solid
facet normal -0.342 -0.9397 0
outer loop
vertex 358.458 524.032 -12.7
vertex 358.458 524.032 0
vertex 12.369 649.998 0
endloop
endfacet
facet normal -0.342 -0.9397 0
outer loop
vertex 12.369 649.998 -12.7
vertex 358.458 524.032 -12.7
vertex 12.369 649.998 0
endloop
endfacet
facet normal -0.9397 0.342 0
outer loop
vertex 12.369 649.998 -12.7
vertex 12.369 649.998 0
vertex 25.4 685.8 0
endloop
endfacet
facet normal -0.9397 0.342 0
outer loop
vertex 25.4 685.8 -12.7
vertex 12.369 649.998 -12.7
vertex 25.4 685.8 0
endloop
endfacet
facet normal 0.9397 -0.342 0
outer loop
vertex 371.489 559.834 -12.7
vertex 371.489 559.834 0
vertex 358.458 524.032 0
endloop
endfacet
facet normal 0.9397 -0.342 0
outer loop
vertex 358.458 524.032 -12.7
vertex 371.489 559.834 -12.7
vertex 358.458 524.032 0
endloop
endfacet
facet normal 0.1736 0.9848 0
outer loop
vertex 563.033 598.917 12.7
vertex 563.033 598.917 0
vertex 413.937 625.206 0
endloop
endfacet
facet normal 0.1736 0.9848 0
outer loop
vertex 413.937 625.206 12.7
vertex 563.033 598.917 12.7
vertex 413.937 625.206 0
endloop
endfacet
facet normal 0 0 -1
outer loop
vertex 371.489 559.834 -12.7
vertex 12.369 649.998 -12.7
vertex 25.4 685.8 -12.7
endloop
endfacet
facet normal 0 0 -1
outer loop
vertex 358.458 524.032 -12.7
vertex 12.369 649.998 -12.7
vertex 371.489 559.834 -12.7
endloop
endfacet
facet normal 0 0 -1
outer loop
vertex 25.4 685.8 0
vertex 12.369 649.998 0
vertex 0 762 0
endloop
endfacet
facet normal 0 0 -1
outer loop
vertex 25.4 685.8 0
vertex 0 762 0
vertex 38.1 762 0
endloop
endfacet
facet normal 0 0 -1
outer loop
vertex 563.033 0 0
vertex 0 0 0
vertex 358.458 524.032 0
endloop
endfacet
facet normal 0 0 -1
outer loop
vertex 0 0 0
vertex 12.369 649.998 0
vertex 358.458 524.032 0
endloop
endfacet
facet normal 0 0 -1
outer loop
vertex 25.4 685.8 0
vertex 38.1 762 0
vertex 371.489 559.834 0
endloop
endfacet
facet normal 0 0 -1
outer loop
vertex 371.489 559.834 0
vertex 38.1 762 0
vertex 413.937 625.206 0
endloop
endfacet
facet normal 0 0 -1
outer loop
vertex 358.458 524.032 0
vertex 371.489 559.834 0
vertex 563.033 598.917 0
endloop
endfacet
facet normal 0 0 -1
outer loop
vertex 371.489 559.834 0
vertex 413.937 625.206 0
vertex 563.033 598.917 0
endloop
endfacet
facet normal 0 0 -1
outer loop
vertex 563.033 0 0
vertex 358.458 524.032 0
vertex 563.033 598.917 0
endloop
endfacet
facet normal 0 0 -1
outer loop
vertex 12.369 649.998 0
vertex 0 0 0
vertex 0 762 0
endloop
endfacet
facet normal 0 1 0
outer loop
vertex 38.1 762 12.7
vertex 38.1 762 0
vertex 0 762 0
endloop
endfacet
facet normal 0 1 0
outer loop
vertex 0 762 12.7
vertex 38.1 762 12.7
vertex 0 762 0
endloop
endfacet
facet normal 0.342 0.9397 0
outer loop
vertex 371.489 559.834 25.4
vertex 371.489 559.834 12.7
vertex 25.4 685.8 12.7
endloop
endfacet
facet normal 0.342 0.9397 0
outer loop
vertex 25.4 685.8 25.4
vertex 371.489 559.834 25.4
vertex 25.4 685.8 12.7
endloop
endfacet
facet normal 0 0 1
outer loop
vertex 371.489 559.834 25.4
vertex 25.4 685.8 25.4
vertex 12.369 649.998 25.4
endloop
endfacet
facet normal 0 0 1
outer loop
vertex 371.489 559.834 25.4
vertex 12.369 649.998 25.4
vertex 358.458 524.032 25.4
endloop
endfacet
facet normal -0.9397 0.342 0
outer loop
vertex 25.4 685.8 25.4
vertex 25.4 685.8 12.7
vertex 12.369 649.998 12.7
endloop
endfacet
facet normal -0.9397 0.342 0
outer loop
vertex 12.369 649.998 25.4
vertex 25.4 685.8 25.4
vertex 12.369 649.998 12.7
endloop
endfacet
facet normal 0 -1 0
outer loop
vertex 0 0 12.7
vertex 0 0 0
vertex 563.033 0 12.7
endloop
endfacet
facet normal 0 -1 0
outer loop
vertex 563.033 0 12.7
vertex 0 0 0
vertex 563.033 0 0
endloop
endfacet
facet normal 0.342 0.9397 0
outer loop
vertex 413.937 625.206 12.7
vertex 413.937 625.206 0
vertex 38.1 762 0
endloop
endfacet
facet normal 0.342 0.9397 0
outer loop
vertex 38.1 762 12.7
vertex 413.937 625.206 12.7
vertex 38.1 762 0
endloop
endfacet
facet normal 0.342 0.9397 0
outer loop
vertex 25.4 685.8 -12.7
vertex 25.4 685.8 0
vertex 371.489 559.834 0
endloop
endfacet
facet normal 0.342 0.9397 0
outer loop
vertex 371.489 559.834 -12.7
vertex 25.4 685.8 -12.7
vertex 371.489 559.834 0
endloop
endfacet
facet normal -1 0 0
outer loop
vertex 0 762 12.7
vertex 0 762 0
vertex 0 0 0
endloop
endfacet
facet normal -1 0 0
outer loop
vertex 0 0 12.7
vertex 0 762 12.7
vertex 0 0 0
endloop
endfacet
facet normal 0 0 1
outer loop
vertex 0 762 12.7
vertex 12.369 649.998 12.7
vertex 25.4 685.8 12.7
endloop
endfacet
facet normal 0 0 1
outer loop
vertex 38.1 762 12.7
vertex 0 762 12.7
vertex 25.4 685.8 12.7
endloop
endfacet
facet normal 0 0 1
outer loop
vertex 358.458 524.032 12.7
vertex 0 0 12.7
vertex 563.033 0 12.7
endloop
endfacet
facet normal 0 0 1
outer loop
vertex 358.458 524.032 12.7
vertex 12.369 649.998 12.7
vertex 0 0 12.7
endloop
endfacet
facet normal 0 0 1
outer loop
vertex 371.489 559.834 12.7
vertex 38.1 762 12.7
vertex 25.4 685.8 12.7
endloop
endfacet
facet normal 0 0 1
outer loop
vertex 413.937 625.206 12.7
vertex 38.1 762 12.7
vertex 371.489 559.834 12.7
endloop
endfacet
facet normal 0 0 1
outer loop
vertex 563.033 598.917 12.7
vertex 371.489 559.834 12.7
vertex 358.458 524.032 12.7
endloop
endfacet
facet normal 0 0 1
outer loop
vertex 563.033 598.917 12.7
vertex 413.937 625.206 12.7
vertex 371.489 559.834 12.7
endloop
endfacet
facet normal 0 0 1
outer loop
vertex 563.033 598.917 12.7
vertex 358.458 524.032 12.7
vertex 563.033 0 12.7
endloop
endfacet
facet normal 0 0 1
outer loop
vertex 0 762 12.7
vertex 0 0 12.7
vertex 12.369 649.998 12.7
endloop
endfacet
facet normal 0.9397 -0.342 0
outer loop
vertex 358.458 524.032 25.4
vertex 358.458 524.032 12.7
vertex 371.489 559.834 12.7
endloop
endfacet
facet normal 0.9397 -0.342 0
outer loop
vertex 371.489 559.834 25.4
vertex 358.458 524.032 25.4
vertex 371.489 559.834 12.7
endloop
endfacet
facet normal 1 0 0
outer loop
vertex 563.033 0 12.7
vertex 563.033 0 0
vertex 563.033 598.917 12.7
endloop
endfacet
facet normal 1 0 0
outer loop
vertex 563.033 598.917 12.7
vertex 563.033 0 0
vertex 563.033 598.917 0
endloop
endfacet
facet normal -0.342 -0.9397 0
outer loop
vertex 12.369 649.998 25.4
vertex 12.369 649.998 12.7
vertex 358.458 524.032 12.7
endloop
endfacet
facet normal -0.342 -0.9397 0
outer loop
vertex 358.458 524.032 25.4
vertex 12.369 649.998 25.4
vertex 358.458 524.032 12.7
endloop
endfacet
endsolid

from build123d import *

# Parameters (mm, degrees)
F1_DEPTH = 12.7
F3_DEPTH = 12.7
F5_DEPTH = 12.7


with BuildPart() as f1:
    # F0 (on Top) → F1 (new body)
    with BuildSketch(Plane.XY):
        Polygon((0, 762), (0, 0), (563.033164, 0), (563.033164, 598.91676), (413.93744, 625.206359), (38.1, 762), align=None)
    extrude(amount=F1_DEPTH)

    # F2 (on face) → F3 (join)
    with BuildSketch(Plane.XY.offset(12.7)):
        Polygon((371.488792, 559.833981), (25.4, 685.8), (12.369033, 649.997711), (358.457825, 524.031692), align=None)
    extrude(amount=F3_DEPTH)

    # F4 (on face) → F5 (join)
    with BuildSketch(Plane(origin=(0, 0, 0), x_dir=(1, 0, 0), z_dir=(0, 0, -1))):
        Polygon((12.369033, -649.997711), (25.4, -685.8), (371.488792, -559.833981), (358.457825, -524.031692), align=None)
    extrude(amount=F5_DEPTH)


solid = f1.part
